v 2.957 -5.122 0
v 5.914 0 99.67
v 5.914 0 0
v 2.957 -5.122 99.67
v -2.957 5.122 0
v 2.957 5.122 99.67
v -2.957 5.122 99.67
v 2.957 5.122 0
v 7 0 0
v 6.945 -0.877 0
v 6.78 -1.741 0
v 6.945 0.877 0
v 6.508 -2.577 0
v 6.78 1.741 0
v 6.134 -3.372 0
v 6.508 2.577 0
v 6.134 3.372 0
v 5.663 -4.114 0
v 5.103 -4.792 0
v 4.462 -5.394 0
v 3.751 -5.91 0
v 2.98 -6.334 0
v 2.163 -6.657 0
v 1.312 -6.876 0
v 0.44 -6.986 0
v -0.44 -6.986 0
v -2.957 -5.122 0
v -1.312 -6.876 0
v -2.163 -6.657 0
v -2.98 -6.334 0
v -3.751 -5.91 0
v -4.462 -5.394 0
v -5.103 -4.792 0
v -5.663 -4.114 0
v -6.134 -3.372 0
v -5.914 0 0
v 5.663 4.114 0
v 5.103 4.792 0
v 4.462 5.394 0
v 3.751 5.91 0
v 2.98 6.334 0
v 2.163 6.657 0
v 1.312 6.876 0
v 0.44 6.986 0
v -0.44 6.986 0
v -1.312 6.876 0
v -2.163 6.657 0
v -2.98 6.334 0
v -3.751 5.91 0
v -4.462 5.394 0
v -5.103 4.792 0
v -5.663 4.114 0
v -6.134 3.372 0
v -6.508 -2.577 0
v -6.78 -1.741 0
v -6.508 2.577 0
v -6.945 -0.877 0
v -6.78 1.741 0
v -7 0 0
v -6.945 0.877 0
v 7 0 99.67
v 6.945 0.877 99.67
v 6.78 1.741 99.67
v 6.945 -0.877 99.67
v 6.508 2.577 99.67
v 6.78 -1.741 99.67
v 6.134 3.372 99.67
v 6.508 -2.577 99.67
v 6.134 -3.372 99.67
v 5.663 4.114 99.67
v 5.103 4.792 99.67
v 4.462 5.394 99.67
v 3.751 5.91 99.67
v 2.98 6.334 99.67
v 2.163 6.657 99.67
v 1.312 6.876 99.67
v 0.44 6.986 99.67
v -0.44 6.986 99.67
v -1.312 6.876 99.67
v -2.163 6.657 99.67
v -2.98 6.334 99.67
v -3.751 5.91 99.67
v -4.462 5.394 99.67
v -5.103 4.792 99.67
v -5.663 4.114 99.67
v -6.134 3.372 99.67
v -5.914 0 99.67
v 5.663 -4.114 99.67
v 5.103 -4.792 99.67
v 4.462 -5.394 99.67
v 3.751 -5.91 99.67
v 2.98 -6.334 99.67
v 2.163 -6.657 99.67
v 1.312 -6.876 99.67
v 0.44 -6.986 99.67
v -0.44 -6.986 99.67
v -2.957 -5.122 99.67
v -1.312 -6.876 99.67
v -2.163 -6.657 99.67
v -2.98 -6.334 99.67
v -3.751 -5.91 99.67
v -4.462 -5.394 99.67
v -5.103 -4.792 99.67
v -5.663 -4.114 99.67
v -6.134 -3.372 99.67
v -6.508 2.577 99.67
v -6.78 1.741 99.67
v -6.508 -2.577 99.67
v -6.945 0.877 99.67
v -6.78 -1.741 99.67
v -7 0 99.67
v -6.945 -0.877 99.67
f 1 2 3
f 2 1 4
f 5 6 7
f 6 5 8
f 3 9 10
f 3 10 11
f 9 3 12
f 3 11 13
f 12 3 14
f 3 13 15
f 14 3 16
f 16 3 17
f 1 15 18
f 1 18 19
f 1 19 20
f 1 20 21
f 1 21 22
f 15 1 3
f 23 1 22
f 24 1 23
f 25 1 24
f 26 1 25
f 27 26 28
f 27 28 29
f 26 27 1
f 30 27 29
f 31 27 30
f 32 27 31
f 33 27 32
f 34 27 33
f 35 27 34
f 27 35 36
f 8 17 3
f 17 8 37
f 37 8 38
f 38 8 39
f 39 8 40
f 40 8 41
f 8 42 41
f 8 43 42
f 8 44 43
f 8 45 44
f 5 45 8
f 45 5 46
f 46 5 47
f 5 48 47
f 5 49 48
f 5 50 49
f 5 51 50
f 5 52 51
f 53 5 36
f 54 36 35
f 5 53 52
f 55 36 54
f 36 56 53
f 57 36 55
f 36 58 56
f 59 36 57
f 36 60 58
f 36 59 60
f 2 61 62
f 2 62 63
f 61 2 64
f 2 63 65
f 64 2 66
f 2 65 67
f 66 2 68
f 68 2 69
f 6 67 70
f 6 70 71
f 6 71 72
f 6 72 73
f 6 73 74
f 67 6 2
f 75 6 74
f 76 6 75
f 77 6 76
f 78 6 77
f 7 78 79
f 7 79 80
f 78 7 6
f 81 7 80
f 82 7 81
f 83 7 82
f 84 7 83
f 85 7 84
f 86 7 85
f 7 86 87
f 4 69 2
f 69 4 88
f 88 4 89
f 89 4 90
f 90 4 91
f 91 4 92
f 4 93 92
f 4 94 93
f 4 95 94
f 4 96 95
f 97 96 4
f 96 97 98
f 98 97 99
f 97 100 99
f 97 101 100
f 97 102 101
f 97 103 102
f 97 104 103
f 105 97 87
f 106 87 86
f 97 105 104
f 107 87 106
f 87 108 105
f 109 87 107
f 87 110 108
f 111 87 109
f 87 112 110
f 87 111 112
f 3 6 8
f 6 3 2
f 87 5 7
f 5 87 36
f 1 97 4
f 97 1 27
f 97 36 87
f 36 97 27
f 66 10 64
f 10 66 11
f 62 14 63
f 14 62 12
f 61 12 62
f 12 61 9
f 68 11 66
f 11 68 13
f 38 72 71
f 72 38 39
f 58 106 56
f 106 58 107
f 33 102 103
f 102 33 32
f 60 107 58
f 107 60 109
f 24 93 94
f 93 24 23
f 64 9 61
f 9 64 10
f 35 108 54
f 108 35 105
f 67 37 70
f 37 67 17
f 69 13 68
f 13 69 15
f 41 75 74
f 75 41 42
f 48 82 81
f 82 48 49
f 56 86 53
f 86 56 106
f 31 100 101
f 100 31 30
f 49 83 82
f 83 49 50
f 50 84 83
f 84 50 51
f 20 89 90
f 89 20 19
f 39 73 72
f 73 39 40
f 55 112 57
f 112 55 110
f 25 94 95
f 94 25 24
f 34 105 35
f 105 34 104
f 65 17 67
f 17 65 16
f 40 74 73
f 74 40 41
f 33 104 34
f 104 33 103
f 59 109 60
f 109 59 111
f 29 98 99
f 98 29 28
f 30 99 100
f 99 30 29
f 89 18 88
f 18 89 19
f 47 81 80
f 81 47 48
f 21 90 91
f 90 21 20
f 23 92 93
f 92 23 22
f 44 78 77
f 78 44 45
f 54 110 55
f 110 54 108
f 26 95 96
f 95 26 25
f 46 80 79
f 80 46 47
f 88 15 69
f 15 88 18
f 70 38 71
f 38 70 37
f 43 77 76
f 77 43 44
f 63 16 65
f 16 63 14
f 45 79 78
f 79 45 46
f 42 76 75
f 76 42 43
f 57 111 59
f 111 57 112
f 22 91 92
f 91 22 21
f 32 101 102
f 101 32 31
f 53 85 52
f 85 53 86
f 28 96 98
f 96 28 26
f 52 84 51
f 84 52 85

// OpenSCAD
$fn = 50;


difference() {
	union() {
		cylinder(h = 99.6700000000, r = 7.0000000000);
	}
	union() {
		translate(v = [0, 0, 0]) {
			rotate(a = [0, 0, 0]) {
				difference() {
					union() {
						#linear_extrude(height = 99.6700000000) {
							polygon(points = [[5.9142500000, 0.0000000000], [2.9571250000, 5.1218907443], [-2.9571250000, 5.1218907443], [-5.9142500000, 0.0000000000], [-2.9571250000, -5.1218907443], [2.9571250000, -5.1218907443]]);
						}
					}
					union();
				}
			}
		}
		translate(v = [0, 0, -100]) {
			cylinder(h = 200, r = 3.2500000000);
		}
		translate(v = [0, 0, -100]) {
			cylinder(h = 200, r = 1.8000000000);
		}
	}
}
